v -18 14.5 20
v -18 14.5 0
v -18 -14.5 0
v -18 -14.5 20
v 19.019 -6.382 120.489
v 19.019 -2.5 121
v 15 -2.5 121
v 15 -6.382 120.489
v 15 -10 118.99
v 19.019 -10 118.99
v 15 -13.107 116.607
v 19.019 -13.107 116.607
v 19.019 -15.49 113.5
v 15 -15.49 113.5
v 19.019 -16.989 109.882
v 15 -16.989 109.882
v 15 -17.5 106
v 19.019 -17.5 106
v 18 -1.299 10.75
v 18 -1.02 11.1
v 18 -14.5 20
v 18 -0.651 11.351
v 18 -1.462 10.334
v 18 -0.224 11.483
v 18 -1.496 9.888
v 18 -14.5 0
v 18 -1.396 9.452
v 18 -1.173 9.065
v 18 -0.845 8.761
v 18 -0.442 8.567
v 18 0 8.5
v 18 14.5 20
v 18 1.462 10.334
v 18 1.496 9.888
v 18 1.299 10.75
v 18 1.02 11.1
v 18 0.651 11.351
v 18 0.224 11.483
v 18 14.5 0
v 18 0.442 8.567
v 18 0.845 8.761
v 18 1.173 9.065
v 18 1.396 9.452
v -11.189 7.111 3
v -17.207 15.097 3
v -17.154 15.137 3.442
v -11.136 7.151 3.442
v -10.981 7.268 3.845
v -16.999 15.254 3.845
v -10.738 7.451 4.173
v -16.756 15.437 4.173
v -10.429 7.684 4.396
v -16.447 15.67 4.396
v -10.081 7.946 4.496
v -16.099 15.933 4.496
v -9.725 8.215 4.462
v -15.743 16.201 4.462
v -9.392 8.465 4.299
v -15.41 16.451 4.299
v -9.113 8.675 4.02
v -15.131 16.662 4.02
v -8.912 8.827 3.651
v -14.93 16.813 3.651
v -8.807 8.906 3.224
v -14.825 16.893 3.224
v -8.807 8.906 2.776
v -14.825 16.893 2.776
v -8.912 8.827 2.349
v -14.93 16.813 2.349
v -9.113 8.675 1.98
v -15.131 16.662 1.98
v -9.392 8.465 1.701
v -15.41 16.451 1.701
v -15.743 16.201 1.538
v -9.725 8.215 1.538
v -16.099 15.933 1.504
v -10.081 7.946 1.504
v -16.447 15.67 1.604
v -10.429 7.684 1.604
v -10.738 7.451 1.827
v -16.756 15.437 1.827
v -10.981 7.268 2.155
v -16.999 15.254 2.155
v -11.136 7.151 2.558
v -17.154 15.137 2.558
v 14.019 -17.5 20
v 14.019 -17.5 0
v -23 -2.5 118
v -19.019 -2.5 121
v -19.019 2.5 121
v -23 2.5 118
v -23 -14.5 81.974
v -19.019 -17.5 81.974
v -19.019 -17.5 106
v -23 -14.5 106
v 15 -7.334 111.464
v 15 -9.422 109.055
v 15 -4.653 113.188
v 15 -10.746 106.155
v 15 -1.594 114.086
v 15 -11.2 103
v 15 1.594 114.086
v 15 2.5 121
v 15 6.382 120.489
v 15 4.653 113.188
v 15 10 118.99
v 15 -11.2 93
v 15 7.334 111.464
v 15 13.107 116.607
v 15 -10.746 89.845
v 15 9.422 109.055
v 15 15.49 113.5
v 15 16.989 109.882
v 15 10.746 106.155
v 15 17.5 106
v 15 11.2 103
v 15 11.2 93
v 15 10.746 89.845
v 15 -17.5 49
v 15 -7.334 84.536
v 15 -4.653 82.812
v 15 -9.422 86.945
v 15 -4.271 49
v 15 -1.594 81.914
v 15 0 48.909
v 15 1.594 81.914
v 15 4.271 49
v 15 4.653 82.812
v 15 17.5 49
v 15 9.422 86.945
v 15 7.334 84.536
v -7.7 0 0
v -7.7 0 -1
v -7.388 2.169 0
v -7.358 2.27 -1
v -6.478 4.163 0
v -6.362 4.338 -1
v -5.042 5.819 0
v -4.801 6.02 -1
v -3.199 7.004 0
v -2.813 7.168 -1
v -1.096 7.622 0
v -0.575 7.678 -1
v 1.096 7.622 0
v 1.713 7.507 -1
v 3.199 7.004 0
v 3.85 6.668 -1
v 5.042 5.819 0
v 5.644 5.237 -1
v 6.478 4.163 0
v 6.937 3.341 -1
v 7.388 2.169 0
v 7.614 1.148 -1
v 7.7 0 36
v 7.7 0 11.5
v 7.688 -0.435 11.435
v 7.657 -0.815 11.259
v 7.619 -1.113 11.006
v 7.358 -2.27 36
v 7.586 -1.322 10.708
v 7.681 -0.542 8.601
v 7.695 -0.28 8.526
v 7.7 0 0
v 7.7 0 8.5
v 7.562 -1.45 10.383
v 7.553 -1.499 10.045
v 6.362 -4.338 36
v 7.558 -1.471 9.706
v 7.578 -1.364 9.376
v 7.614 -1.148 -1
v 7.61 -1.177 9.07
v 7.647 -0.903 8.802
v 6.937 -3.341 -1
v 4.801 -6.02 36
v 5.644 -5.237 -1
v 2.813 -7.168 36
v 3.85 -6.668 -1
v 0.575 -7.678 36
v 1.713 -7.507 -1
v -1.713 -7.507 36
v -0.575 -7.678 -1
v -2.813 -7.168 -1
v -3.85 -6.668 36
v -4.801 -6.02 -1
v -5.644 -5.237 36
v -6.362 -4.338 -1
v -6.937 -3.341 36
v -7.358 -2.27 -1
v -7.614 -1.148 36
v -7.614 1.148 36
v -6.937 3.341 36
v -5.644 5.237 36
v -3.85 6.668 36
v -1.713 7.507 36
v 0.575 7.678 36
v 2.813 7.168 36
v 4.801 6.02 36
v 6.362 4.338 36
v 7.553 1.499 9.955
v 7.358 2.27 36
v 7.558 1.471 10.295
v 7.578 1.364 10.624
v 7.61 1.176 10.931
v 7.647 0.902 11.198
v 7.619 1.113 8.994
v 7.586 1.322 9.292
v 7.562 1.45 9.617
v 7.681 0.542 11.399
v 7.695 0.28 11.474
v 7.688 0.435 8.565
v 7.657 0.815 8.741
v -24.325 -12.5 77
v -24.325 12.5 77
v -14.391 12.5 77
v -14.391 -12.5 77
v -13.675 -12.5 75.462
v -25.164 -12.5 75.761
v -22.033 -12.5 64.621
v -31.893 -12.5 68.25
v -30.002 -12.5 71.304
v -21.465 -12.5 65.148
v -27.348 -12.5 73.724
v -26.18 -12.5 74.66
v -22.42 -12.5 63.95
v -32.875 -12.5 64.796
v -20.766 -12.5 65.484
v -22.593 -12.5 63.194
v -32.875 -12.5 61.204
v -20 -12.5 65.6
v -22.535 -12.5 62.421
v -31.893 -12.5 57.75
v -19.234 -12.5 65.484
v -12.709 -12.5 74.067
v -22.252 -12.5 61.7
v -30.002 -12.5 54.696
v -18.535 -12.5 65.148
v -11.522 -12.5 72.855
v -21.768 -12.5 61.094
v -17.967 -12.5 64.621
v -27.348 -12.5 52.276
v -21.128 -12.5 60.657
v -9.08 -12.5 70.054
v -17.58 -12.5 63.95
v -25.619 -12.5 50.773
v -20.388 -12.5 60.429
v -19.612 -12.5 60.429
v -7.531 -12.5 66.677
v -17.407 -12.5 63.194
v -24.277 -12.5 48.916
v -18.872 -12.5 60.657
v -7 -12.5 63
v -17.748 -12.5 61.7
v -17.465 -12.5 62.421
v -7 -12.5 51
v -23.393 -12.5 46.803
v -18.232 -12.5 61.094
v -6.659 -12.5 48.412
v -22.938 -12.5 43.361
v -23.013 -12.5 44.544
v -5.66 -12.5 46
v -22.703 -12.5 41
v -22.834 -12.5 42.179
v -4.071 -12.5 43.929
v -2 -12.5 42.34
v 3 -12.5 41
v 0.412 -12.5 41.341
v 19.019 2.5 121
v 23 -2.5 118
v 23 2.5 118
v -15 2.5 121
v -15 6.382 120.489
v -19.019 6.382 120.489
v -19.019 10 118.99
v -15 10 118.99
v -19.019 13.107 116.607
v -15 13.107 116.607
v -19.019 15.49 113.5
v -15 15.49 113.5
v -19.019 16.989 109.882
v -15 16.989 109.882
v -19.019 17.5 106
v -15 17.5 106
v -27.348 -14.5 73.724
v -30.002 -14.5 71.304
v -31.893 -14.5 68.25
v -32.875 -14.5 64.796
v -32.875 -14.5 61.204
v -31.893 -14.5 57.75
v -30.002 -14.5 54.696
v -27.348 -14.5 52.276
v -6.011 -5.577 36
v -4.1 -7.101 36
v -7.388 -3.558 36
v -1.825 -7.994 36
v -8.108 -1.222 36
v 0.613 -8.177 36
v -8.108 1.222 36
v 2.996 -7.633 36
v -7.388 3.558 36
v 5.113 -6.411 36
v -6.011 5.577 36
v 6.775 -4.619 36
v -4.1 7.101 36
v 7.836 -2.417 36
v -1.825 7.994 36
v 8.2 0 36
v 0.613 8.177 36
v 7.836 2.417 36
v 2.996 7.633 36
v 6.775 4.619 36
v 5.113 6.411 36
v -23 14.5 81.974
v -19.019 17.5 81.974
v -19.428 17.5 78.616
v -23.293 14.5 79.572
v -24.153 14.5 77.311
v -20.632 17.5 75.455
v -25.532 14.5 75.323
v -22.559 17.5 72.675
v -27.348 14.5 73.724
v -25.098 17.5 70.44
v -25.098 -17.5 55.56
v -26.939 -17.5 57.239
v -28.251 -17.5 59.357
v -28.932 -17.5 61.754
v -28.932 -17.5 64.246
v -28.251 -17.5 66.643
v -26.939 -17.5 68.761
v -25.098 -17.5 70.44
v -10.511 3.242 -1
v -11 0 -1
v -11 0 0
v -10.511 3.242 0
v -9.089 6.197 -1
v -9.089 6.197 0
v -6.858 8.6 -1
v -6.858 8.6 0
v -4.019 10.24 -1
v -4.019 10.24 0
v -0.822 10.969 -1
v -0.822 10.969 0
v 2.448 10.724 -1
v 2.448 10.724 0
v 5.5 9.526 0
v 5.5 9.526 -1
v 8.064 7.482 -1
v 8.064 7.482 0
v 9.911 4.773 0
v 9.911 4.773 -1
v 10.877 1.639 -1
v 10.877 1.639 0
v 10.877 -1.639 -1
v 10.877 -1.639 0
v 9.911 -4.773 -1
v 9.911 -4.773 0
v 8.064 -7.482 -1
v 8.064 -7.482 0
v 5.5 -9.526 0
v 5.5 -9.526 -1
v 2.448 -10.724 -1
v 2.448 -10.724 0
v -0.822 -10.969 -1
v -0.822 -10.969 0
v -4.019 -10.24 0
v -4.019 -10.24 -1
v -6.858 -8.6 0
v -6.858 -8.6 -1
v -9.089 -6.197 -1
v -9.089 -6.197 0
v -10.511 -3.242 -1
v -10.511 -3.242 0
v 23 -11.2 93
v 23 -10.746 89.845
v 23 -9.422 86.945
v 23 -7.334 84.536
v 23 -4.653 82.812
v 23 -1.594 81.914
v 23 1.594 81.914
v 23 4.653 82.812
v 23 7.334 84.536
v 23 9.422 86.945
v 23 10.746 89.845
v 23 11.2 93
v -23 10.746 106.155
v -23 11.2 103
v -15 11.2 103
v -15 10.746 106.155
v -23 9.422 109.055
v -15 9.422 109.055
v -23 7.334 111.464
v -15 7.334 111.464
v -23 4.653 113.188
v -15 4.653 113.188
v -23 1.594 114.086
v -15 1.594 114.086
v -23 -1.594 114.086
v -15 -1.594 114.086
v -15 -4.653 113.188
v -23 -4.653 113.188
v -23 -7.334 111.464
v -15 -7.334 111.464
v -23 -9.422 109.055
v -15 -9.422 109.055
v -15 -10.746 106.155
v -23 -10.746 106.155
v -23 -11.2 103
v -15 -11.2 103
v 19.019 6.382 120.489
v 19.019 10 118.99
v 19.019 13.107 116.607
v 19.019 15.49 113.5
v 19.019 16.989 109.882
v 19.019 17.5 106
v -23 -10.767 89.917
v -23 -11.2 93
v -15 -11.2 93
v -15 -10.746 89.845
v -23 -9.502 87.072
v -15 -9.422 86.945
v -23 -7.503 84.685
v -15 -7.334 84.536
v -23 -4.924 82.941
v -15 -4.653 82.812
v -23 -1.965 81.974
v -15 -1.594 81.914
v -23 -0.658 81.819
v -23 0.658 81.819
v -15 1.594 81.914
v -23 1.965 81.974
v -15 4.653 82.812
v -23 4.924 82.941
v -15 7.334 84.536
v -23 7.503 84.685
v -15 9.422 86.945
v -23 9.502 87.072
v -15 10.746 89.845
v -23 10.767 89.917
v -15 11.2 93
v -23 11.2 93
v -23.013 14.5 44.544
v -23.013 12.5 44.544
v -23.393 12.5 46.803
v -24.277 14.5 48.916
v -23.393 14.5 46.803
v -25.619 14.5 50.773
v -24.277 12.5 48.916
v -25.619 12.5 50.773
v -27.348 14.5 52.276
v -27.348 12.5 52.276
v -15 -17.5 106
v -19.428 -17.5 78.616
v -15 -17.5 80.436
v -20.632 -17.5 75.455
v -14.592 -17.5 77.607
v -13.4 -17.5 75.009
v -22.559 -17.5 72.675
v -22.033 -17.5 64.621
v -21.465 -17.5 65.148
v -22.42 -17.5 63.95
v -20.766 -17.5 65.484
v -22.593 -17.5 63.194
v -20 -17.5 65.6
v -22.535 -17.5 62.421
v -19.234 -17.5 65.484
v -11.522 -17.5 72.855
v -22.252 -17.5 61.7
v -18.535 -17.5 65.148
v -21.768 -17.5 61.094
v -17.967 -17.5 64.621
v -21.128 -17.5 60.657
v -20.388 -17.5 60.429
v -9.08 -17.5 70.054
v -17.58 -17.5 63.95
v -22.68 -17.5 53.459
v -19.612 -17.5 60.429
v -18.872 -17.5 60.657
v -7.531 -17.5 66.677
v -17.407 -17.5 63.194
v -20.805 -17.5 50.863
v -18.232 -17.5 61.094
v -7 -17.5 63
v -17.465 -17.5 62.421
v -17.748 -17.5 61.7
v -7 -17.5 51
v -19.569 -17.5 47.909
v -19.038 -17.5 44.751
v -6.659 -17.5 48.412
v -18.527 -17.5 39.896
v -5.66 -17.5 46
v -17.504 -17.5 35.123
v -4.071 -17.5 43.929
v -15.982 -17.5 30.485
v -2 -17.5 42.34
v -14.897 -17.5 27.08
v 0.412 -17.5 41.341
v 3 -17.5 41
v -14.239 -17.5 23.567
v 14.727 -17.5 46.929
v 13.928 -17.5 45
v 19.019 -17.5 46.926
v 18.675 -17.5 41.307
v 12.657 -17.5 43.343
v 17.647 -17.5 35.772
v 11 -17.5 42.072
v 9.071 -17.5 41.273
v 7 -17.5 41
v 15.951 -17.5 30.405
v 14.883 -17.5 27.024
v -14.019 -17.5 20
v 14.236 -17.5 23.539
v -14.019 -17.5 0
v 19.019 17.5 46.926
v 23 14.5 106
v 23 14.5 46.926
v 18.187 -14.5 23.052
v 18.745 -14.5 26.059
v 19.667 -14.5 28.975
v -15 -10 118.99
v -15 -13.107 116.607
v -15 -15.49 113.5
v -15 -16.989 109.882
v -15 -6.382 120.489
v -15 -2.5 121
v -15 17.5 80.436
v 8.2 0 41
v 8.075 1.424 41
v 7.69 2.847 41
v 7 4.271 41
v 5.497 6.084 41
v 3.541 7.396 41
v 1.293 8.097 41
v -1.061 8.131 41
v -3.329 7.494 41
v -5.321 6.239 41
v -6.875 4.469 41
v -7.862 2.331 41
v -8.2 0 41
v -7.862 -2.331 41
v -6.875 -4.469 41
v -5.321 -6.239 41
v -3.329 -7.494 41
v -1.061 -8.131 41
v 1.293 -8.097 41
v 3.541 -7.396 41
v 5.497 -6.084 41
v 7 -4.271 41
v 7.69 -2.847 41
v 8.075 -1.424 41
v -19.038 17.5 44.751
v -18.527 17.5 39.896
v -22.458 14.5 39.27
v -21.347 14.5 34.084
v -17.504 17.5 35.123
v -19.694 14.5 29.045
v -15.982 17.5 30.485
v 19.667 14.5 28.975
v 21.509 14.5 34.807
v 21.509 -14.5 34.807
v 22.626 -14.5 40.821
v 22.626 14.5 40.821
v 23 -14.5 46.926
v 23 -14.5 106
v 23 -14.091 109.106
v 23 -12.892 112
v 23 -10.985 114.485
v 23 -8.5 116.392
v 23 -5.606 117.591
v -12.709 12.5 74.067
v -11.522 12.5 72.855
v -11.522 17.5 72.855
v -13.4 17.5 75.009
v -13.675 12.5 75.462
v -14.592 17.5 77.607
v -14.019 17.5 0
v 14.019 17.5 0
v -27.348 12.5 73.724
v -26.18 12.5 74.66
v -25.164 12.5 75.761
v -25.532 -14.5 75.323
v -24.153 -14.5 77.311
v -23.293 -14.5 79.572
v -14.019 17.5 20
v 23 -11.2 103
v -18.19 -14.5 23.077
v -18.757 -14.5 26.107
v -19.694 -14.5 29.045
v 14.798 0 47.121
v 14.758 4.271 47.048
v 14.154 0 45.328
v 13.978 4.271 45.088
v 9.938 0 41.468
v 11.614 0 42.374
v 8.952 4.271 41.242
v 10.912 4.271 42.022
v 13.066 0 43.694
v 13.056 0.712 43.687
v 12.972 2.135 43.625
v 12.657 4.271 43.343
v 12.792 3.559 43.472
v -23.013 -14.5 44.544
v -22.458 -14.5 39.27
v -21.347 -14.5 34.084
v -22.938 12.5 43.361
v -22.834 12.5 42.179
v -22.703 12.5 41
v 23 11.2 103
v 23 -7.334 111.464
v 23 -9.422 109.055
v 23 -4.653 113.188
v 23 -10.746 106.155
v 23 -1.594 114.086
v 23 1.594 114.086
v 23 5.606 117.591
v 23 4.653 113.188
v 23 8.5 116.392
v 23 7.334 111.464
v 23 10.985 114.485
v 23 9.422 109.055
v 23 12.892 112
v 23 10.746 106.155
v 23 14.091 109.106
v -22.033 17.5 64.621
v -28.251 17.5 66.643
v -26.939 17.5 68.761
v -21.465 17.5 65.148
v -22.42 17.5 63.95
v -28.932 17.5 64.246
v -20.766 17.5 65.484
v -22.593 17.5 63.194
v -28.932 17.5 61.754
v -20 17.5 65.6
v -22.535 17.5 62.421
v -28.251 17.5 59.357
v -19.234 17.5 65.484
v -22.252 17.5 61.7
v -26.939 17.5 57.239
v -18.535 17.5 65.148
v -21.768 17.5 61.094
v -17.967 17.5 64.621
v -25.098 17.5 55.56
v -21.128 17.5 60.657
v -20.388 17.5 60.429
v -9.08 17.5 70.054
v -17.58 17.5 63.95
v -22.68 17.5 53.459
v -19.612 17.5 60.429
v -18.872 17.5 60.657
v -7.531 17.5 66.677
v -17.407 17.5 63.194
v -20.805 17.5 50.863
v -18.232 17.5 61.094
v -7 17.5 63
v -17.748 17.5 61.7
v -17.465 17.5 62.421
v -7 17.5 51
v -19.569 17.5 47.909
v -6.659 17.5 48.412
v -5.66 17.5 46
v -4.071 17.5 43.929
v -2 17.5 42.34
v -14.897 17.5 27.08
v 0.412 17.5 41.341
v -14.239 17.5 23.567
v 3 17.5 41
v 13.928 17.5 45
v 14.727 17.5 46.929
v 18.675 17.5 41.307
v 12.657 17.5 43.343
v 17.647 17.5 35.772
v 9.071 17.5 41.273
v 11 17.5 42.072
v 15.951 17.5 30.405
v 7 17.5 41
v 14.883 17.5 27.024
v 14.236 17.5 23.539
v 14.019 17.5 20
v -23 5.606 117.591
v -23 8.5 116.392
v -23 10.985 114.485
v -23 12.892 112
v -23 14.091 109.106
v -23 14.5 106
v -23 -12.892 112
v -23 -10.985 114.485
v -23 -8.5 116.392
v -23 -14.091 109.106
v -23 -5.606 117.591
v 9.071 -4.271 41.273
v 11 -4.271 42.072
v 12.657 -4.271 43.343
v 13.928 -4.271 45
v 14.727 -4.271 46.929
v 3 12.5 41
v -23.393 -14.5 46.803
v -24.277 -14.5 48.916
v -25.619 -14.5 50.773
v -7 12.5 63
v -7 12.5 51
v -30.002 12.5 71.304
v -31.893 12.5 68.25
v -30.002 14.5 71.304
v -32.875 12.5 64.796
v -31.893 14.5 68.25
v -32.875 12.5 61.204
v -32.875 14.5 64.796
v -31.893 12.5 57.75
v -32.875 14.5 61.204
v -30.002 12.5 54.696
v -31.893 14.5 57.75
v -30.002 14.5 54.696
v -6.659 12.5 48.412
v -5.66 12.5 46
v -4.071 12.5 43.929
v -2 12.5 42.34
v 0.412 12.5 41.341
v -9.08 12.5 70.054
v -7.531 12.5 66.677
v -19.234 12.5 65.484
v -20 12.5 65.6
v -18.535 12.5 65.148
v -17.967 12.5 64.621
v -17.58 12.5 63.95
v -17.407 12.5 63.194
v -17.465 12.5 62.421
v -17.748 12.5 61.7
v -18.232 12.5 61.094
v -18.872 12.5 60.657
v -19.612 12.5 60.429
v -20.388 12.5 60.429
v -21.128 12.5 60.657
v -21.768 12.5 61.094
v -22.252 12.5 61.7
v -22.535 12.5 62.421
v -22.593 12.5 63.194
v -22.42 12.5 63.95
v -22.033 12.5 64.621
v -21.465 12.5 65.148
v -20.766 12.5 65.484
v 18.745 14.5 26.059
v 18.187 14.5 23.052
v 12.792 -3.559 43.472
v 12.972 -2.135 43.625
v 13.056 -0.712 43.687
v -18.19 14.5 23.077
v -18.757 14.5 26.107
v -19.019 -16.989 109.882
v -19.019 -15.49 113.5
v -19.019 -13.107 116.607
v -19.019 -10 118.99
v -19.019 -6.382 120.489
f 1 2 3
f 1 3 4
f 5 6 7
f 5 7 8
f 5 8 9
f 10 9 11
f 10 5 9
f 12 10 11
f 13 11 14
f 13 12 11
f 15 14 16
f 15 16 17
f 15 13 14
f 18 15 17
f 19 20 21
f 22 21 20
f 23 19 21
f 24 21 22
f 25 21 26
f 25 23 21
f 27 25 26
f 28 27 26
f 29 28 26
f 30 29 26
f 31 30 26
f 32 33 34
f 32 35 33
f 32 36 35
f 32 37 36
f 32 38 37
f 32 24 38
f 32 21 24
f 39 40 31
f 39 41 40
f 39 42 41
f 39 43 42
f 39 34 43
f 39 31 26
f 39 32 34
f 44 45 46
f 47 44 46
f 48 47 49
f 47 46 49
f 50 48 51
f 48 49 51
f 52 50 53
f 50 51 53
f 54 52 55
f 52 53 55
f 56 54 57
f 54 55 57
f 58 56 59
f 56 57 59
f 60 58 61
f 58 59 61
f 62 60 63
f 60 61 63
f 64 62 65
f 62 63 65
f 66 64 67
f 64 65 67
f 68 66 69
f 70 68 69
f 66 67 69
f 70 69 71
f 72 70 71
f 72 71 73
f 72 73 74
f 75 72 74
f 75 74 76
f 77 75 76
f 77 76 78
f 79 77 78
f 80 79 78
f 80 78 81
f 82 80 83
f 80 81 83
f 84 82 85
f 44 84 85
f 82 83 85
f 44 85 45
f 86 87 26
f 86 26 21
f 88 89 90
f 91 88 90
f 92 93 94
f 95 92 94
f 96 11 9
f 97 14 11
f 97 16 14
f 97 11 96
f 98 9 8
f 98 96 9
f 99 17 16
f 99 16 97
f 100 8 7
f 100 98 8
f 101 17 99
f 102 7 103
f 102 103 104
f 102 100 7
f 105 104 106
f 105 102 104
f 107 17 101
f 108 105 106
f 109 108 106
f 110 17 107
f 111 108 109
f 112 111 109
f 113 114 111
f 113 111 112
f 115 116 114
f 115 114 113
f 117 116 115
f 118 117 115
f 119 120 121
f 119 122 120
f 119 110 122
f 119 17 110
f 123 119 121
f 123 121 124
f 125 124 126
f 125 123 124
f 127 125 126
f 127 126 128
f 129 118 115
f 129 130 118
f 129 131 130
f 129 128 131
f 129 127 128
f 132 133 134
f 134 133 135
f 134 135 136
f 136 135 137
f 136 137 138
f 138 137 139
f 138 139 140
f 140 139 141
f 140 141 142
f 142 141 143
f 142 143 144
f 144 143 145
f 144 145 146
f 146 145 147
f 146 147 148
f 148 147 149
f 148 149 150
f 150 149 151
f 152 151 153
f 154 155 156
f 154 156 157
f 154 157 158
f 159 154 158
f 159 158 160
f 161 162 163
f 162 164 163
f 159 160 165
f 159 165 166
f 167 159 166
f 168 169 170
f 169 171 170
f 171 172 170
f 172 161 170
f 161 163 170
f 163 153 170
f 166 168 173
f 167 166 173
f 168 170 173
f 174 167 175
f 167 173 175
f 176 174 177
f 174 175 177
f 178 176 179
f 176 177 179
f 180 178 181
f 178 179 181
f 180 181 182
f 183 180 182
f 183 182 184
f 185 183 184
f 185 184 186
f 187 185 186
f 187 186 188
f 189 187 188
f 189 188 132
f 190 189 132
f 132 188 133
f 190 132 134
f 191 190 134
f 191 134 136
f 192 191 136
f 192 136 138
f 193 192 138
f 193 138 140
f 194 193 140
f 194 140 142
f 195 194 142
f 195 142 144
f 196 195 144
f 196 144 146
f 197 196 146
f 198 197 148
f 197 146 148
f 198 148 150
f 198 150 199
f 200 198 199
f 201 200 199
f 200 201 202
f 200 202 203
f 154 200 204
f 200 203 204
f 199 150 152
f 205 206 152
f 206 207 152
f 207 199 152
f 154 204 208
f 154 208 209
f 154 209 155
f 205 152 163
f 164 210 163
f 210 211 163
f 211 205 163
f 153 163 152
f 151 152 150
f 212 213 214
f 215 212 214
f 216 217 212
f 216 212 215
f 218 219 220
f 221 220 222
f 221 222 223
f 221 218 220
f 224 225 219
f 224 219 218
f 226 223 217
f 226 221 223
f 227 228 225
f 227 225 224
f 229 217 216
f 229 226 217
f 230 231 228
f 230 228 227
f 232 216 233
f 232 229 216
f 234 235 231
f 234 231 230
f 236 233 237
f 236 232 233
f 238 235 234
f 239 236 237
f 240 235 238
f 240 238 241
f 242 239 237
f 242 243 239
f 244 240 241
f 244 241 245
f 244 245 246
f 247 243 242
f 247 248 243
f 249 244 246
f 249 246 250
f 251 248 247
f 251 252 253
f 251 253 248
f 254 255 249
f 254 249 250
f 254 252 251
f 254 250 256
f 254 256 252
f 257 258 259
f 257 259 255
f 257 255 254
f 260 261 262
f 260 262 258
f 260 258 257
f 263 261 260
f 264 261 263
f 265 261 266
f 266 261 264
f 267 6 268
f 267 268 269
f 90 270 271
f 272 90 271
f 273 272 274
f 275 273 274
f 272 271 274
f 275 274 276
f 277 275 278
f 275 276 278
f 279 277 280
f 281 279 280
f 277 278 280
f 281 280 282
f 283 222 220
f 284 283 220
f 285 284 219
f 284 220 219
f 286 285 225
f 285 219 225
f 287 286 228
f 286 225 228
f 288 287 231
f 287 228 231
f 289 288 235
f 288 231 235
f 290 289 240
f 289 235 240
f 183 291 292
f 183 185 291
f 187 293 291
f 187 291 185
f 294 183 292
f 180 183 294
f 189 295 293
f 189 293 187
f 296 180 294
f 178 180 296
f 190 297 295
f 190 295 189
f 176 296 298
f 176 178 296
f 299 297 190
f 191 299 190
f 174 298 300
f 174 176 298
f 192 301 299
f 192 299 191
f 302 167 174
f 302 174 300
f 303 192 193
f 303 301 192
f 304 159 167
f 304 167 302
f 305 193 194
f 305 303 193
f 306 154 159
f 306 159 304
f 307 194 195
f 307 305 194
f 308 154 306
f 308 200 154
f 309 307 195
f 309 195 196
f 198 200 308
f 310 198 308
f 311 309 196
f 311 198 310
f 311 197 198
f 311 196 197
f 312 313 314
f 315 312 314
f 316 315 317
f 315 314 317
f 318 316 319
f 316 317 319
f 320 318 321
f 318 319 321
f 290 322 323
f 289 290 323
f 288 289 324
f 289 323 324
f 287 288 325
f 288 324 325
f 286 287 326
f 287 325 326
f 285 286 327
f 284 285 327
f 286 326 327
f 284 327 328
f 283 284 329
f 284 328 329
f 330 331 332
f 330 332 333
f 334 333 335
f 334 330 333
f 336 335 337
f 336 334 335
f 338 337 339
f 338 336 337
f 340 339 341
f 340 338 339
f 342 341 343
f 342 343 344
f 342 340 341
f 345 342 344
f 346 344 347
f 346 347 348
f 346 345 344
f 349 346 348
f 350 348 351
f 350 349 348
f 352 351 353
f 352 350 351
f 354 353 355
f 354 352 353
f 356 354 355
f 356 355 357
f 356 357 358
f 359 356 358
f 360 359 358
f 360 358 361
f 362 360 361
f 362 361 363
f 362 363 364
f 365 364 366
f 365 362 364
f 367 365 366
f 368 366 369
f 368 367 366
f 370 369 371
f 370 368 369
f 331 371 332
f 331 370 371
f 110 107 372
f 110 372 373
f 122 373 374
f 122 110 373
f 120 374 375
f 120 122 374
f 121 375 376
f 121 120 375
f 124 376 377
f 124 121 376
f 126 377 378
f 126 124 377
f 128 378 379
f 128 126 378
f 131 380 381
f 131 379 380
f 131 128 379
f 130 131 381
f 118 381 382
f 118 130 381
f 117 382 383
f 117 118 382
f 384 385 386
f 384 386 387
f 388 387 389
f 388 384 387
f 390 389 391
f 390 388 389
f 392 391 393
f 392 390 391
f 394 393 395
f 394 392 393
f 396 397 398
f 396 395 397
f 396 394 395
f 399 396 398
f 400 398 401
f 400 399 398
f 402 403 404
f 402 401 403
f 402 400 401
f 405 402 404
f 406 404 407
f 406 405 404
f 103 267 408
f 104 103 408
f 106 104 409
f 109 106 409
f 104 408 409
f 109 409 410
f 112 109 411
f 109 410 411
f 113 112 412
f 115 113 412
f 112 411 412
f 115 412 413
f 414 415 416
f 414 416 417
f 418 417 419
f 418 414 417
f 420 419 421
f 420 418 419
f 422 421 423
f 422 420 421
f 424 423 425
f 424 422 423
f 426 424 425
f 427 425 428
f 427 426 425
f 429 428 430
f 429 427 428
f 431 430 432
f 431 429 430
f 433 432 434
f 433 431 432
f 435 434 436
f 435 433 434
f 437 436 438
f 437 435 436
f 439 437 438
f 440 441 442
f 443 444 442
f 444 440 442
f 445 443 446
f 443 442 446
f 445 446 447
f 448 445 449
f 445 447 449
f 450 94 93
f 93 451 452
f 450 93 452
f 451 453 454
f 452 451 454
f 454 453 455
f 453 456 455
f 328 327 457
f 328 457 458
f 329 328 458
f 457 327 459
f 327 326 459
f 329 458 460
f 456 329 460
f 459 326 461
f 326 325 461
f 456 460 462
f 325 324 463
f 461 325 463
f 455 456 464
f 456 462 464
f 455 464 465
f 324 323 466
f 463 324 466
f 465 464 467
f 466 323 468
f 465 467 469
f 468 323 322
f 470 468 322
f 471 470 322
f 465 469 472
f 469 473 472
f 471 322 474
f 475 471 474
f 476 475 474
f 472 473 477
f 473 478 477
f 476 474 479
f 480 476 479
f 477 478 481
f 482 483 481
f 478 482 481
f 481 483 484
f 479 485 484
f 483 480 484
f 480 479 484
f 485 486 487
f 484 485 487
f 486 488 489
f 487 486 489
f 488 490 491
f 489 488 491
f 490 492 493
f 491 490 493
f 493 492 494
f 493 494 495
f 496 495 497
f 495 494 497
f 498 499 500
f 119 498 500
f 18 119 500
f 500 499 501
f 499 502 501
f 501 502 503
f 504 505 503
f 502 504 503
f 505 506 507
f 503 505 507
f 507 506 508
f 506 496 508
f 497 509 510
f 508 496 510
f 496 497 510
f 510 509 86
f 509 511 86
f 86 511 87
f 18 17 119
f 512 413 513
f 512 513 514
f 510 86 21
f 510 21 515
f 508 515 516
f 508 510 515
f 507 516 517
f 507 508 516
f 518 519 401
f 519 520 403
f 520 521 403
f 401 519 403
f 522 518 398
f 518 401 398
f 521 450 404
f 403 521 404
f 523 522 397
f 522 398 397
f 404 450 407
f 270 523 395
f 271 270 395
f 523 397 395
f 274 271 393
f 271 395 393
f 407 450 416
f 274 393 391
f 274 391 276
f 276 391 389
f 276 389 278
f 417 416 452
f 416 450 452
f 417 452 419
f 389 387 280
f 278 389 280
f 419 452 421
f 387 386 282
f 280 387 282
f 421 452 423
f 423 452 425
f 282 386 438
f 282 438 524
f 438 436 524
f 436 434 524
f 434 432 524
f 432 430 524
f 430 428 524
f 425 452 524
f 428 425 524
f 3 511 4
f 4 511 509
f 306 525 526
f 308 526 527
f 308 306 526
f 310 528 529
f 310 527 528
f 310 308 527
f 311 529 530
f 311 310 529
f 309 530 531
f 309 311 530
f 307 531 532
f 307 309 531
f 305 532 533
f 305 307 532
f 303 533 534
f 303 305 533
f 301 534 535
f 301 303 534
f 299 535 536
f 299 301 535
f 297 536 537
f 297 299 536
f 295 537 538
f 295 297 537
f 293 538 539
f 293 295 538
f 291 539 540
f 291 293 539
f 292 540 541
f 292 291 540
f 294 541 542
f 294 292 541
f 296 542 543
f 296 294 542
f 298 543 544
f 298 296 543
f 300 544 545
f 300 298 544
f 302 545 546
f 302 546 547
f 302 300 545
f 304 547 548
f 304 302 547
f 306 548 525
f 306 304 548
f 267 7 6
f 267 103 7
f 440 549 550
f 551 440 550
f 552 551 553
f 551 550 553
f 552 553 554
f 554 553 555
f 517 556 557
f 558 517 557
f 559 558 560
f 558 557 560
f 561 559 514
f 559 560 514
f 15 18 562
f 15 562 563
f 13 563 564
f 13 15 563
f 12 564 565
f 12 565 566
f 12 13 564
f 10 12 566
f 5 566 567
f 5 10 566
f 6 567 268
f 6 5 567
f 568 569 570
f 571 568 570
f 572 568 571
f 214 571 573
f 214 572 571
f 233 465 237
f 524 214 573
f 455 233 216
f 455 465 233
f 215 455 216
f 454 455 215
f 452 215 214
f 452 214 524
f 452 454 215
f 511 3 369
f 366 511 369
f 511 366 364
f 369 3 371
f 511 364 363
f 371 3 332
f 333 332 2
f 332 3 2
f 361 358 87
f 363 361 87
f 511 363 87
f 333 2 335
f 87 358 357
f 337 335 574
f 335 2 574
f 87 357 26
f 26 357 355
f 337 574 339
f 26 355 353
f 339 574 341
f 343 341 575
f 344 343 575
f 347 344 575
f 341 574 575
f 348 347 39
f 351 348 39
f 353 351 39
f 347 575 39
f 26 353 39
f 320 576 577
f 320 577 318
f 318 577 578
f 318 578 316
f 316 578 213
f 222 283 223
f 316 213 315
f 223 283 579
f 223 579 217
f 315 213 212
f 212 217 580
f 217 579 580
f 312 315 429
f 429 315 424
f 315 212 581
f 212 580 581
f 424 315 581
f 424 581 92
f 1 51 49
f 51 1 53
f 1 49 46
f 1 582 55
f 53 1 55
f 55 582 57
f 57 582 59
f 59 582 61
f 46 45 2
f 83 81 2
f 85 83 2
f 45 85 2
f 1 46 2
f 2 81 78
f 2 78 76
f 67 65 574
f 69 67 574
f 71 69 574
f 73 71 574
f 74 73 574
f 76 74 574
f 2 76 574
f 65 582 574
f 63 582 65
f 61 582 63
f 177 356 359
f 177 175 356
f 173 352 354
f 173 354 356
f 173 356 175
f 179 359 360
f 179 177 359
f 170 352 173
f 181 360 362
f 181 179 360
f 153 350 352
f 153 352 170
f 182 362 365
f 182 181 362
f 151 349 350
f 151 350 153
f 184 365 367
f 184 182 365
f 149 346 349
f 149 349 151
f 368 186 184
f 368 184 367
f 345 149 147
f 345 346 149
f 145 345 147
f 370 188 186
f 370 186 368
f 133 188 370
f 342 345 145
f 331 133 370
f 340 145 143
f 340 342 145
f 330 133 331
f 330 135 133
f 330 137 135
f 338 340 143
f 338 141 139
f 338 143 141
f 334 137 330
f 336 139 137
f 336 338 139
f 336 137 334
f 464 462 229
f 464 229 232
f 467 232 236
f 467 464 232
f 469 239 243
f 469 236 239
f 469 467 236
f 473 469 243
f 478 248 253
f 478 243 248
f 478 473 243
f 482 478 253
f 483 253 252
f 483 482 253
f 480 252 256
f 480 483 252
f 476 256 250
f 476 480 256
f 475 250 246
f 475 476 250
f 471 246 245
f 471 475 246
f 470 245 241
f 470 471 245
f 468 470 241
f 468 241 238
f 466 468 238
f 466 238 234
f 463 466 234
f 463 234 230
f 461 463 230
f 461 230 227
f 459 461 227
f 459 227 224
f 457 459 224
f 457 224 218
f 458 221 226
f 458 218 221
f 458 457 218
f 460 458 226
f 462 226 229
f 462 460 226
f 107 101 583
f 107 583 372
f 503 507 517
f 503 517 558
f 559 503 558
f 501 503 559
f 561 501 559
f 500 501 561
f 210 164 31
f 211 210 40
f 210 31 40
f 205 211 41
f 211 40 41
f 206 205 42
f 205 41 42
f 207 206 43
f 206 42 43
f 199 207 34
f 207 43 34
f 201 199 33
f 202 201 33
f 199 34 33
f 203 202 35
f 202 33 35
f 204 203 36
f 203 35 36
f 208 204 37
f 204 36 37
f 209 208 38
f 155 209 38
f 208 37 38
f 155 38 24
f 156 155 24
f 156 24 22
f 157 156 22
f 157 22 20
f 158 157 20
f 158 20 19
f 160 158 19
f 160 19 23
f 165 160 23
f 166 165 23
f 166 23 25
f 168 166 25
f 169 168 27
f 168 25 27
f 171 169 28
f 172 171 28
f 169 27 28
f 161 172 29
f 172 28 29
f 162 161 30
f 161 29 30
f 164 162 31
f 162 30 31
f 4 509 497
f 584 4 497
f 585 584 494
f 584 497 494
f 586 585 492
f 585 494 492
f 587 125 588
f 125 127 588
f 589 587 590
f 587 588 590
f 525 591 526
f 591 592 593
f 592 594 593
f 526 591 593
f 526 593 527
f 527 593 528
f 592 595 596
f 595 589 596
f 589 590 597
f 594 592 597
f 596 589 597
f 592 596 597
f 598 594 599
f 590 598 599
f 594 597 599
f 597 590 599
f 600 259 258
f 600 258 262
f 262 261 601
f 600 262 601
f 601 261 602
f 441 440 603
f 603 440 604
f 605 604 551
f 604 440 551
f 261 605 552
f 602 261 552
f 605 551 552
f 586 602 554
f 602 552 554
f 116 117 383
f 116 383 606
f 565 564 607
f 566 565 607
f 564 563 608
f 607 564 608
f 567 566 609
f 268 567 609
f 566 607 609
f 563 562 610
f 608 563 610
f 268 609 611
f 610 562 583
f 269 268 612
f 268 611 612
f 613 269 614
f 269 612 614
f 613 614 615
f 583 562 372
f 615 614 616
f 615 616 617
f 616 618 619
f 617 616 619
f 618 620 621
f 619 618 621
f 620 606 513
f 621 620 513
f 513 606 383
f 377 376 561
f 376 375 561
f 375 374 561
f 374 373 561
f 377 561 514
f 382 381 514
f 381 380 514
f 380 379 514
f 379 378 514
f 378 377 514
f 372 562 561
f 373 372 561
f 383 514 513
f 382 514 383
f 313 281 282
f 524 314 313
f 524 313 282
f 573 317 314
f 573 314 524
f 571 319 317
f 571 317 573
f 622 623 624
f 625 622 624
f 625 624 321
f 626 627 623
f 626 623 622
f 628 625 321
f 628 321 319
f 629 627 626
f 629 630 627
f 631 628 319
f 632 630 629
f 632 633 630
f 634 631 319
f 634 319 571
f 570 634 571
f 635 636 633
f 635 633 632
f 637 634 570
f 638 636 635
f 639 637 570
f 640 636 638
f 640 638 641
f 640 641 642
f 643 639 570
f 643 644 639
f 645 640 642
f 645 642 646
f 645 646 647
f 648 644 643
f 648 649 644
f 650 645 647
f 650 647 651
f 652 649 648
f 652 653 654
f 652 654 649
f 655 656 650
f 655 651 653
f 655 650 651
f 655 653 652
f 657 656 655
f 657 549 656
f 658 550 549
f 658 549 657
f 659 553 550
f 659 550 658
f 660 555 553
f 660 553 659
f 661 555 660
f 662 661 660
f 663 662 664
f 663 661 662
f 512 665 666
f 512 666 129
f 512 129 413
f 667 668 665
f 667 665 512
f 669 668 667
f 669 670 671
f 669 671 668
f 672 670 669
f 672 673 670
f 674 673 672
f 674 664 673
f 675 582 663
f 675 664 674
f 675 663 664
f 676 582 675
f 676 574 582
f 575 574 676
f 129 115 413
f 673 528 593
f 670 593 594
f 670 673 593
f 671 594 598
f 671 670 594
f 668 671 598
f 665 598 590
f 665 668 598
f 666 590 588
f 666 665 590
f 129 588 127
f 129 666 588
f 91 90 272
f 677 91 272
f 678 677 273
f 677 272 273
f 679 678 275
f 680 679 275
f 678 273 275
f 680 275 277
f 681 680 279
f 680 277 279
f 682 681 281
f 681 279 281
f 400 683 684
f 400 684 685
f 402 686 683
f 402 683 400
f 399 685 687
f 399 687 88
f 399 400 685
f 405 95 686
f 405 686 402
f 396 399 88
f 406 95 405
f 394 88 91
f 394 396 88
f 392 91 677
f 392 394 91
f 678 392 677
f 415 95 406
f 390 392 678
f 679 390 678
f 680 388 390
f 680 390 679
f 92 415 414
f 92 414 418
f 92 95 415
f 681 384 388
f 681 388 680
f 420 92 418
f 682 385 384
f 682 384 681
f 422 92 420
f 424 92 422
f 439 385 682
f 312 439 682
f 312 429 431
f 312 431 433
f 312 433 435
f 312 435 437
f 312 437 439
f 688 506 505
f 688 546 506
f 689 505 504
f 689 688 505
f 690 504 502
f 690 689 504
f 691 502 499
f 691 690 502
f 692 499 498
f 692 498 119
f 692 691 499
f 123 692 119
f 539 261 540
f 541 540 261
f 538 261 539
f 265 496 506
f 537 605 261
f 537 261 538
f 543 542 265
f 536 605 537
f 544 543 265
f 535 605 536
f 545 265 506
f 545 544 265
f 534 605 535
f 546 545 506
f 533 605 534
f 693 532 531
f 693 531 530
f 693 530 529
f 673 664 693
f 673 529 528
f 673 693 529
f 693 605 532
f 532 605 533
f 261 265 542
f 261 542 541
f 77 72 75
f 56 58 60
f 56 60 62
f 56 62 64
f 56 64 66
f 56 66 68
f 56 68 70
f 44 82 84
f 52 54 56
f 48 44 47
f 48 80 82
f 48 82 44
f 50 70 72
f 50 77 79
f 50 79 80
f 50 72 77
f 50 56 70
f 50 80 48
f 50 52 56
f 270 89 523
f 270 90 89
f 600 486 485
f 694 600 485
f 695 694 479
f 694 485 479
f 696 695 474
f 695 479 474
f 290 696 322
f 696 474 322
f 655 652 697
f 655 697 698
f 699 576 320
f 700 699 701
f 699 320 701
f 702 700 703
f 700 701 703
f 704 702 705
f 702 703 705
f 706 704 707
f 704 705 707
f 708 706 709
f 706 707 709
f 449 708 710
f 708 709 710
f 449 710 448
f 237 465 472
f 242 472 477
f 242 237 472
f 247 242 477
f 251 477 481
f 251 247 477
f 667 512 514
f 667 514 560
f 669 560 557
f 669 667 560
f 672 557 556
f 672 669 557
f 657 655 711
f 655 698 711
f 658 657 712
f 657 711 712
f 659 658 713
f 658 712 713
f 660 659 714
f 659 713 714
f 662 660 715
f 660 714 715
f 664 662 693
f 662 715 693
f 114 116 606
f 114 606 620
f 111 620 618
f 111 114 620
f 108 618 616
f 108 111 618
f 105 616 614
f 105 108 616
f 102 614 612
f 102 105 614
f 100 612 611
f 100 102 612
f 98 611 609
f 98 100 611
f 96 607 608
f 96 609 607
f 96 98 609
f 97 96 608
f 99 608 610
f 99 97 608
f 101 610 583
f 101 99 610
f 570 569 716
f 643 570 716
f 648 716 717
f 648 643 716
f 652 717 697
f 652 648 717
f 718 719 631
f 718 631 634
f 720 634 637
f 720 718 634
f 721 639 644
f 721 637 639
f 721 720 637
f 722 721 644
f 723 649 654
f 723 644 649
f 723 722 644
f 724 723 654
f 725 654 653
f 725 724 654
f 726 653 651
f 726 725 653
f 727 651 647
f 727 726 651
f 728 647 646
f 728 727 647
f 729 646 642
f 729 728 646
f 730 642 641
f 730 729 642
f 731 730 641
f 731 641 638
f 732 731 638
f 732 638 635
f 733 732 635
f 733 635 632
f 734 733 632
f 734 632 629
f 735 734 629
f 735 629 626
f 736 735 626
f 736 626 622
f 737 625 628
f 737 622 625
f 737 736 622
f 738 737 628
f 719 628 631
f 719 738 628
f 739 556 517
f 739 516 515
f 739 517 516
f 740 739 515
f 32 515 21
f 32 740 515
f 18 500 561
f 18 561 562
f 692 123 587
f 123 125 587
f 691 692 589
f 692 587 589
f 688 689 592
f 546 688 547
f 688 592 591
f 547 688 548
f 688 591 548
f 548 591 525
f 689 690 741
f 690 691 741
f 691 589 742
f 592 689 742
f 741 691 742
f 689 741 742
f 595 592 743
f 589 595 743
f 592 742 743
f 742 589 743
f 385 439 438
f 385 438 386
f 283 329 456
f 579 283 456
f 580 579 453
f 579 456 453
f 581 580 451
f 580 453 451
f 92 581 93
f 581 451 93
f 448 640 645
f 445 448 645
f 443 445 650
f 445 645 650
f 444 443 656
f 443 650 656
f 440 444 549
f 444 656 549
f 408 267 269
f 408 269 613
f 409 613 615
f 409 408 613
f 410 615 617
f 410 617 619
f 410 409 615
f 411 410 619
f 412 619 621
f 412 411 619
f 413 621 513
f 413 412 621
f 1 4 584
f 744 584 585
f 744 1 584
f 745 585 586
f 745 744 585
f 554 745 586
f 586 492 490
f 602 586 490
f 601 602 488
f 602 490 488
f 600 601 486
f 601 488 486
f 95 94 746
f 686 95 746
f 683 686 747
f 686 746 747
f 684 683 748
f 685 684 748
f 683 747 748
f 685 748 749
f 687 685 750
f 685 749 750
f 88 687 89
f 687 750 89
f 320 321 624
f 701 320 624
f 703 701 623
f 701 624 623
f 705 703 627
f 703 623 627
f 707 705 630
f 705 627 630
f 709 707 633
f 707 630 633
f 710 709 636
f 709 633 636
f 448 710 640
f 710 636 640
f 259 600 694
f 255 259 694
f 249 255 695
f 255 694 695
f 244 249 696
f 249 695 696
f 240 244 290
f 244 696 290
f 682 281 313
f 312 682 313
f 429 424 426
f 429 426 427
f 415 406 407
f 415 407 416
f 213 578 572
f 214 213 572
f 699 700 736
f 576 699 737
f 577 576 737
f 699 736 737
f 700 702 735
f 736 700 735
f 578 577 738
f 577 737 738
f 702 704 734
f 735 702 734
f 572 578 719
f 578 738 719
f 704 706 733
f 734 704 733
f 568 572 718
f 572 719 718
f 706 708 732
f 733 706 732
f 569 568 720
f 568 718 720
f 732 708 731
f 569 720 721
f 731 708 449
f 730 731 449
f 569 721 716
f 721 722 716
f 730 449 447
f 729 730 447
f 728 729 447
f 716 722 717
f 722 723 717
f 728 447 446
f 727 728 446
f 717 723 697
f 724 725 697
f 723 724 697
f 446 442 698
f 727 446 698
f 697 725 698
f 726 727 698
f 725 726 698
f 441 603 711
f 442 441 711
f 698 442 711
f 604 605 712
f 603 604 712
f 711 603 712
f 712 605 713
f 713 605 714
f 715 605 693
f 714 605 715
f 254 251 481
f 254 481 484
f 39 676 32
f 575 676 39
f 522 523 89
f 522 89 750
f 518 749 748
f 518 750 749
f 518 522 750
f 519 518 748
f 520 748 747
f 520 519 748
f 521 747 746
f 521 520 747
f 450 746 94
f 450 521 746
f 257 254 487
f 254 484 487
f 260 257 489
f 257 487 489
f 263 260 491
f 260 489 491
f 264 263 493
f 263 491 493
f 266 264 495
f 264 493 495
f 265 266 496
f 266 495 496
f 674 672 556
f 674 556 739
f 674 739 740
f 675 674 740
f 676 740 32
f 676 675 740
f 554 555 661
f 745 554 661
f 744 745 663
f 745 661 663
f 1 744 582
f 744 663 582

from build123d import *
from OCP.BRepFilletAPI import BRepFilletAPI_MakeChamfer
from build123d.topology import SkipClean

# Parameters (mm, degrees)
SKETCH1_W               = 46
SKETCH1_H               = 35
SKETCH1_R               = 7.7
BOSS_EXTRUDE1_DEPTH     = 36
BOSS_EXTRUDE2_START     = 1
SKETCH2_R               = 11
SKETCH2_R_2             = 7.7
BOSS_EXTRUDE2_DEPTH     = 1
SKETCH5_W               = 8
SKETCH5_H               = 35
BOSS_EXTRUDE4_DEPTH     = 85
SKETCH3_W               = 38
SKETCH3_H               = 35
SKETCH3_R               = 8.2
BOSS_EXTRUDE3_DEPTH     = 5
CUT_EXTRUDE1_DEPTH      = 125.403577119
CUT_EXTRUDE1_DEPTH_BACK = 125.403577119
SKETCH4_R               = 2.6
BOSS_EXTRUDE6_REACH     = 130.043
SKETCH9_W               = 8
SKETCH9_H               = 35
BOSS_EXTRUDE5_DEPTH     = 80
FILLET1_R               = 15
FILLET9_R               = 10
FILLET11_R              = 8
CUT_EXTRUDE2_DEPTH      = 35
FILLET12_R              = 50
SKETCH6_W               = 26
SKETCH6_H               = 36
CUT_EXTRUDE3_DEPTH      = 12.5
FILLET13_R              = 10
CUT_EXTRUDE4_REACH      = 132.626
CHAMFER1_SIZE           = 3
CHAMFER1_SIZE2          = 3.981134465
CUT_EXTRUDE5_REACH      = 134.47
CUT_EXTRUDE5_END_RADIUS = 7.7
SKETCH23_R              = 1.5
SKETCH25_R              = 1.5
CUT_EXTRUDE6_DEPTH      = 10


with BuildPart() as part:
    # Sketch1 → Boss-Extrude1 (new body)
    with BuildSketch(Plane.XY):
        Rectangle(SKETCH1_W, SKETCH1_H)
        Circle(SKETCH1_R, mode=Mode.SUBTRACT)
    extrude(amount=BOSS_EXTRUDE1_DEPTH)

    # Sketch2 → Boss-Extrude2 (add)
    with SkipClean():  # the faces are left unmerged after this step: merging them gives an invalid solid
        with BuildSketch(Plane(origin=(0, 0, 0), x_dir=(-1, 0, 0), z_dir=(0, 0, -1)).offset(BOSS_EXTRUDE2_START)):
            Circle(SKETCH2_R)
            Circle(SKETCH2_R_2, mode=Mode.SUBTRACT)
        extrude(amount=-BOSS_EXTRUDE2_DEPTH)

    # Sketch5 → Boss-Extrude4 (add)
    with SkipClean():  # the faces are left unmerged after this step: merging them gives an invalid solid
        with BuildSketch(Plane.XY.offset(36)):
            with Locations((-19, 0)):
                Rectangle(SKETCH5_W, SKETCH5_H)
        extrude(amount=BOSS_EXTRUDE4_DEPTH)

    # Sketch3 → Boss-Extrude3 (add)
    with BuildSketch(Plane.XY.offset(36)):
        with Locations((4, 0)):
            Rectangle(SKETCH3_W, SKETCH3_H)
        Circle(SKETCH3_R, mode=Mode.SUBTRACT)
    extrude(amount=BOSS_EXTRUDE3_DEPTH)

    # Sketch4 → Cut-Extrude1 (cut, two sides: drawn at the far end of the back side and taken through both)
    with BuildSketch(Plane(origin=(0, 0, 0), x_dir=(1, 0, 0), z_dir=(0, 1, 0)).offset(-CUT_EXTRUDE1_DEPTH_BACK)):
        with Locations(Location((-20, -63, 0), (0, 0, 270))):
            Circle(SKETCH4_R)
    extrude(amount=CUT_EXTRUDE1_DEPTH + CUT_EXTRUDE1_DEPTH_BACK, mode=Mode.SUBTRACT)

    # Boss-Extrude6: up to this face of the body (flat: up to its plane)
    boss_extrude6_end = Plane(part.part.faces().sort_by_distance((-4.685176782, -17.5, 35.598204078))[0])
    # Sketch10 → Boss-Extrude6 (add, up to the picked face)
    with BuildSketch(Plane(origin=(0, 17.5, 0), x_dir=(1, 0, 0), z_dir=(0, 1, 0)), mode=Mode.PRIVATE) as boss_extrude6_sk1:
        with BuildLine():
            Line((-23, -50.350889359), (-23, -75.649110641))
            ThreePointArc((-23, -75.649110641), (-33, -63), (-23, -50.350889359))
        make_face()
    boss_extrude6_tool1 = split(extrude(boss_extrude6_sk1.sketch, amount=-BOSS_EXTRUDE6_REACH, mode=Mode.PRIVATE), bisect_by=boss_extrude6_end, keep=Keep.BOTH, mode=Mode.PRIVATE)
    # Sketch10 → Boss-Extrude6 (add, up to the picked face)
    with BuildSketch(Plane(origin=(0, 17.5, 0), x_dir=(1, 0, 0), z_dir=(0, 1, 0)), mode=Mode.PRIVATE) as boss_extrude6_sk2:
        with BuildLine():
            Line((-15, -41), (-15, -75))
            ThreePointArc((-15, -75), (-9.183346174, -70.211102551), (-7, -63))
            Line((-7, -63), (-7, -41))
            Line((-7, -41), (-15, -41))
        make_face()
    boss_extrude6_tool2 = split(extrude(boss_extrude6_sk2.sketch, amount=-BOSS_EXTRUDE6_REACH, mode=Mode.PRIVATE), bisect_by=boss_extrude6_end, keep=Keep.BOTH, mode=Mode.PRIVATE)
    add(boss_extrude6_tool1.solids().sort_by(Axis((-27.170601, 17.5, 63), (0, -1, 0)))[0])
    add(boss_extrude6_tool2.solids().sort_by(Axis((-11.197055, 17.5, 56.457565), (0, -1, 0)))[0])

    # Sketch9 → Boss-Extrude5 (add)
    with BuildSketch(Plane.XY.offset(41)):
        with Locations((19, 0)):
            Rectangle(SKETCH9_W, SKETCH9_H)
    extrude(amount=BOSS_EXTRUDE5_DEPTH)

    # Fillet1
    fillet1_edges = [part.edges().sort_by_distance(p)[0] for p in [
        (-19, -17.5, 121),
        (-19, 17.5, 121),
        (19, 17.5, 121),
        (19, -17.5, 121),
    ]]
    fillet(fillet1_edges, radius=FILLET1_R)

    # Fillet9
    fillet9_edges = [part.edges().sort_by_distance(p)[0] for p in [
        (-23, 0, 75.649110641),
        (-23, 0, 50.350889359),
        (-15, 0, 75),
    ]]
    fillet(fillet9_edges, radius=FILLET9_R)

    # Fillet11
    fillet11_edges = [part.edges().sort_by_distance(p)[0] for p in [
        (15, 0, 41),
    ]]
    fillet(fillet11_edges, radius=FILLET11_R)

    # Sketch20 → Cut-Extrude2 (cut)
    with BuildSketch(Plane(origin=(0, 17.5, 0), x_dir=(1, 0, 0), z_dir=(0, 1, 0))):
        with BuildLine():
            Line((-18, 0), (-18, -20))
            ThreePointArc((-18, -20), (-19.282917549, -27.90569415), (-23, -35))
            Line((-23, -35), (-23, 0))
            Line((-23, 0), (-18, 0))
        make_face()
        with BuildLine():
            Line((18, -20), (18, 0))
            Line((18, 0), (23, 0))
            Line((23, 0), (23, -35))
            ThreePointArc((23, -35), (19.282917549, -27.90569415), (18, -20))
        make_face()
    extrude(amount=-CUT_EXTRUDE2_DEPTH, mode=Mode.SUBTRACT)

    # Fillet12
    # the kernel refuses this fillet: 50 mm, written as the material it takes off along each edge
    with BuildSketch(Plane(origin=(23, 47.314560089, 35), x_dir=(0, 0, 1), z_dir=(0, -1, 0))) as fillet12_piece_1:
        with BuildLine():
            CenterArc((11.925824036, 50), FILLET12_R, 248.960530219, 21.039469781)
            ThreePointArc((-6.024725321, 3.333333333), (-2.897057104, 1.87507196), (0, 0))
            Line((0, 0), (11.925824036, 0))
        make_face()
    extrude(amount=94.629120178, mode=Mode.SUBTRACT)
    with BuildSketch(Plane(origin=(-23, 41.360846345, 35), x_dir=(0.4854209335921463, 0, -0.8742805712301568), z_dir=(0, -1, 0))) as fillet12_piece_2:
        with BuildLine():
            CenterArc((13.623159586, 49.533850857), FILLET12_R, 243.929167388, 18.240989477)
            Line((-8.350938249, 4.621279963), (-10.548348032, 0.130022873))
            ThreePointArc((-10.548348032, 0.130022873), (-10.318653148, 0.01016864), (-2.427104668, -4.371402856))
            Line((-2.427104668, -4.371402856), (0.681157979, -4.953385086))
            ThreePointArc((0.681157979, -4.953385086), (3.405789897, -4.766925428), (6.130421814, -4.953385086))
            Line((6.130421814, -4.953385086), (6.811579793, 0))
        make_face()
    extrude(amount=82.721692689, mode=Mode.SUBTRACT)

    # Sketch6 → Cut-Extrude3 (cut, symmetric)
    with BuildSketch(Plane(origin=(0, 0, 0), x_dir=(1, 0, 0), z_dir=(0, 1, 0))):
        with Locations((-20, -59)):
            Rectangle(SKETCH6_W, SKETCH6_H)
    extrude(amount=CUT_EXTRUDE3_DEPTH, both=True, mode=Mode.SUBTRACT)

    # Fillet13
    fillet13_edges = [part.edges().sort_by_distance(p)[0] for p in [
        (-7, 15, 41),
        (-7, -15, 41),
    ]]
    fillet(fillet13_edges, radius=FILLET13_R)

    # Cut-Extrude4: up to this face of the body (flat: up to its plane)
    cut_extrude4_end = Plane(part.part.faces().sort_by_distance((23, 0, 82.65958398))[0])
    # Sketch22 → Cut-Extrude4 (cut, up to the picked face)
    with BuildSketch(Plane.ZY.offset(23), mode=Mode.PRIVATE) as cut_extrude4_sk1:
        with BuildLine():
            Line((93, 11.2), (103, 11.2))
            ThreePointArc((103, 11.2), (114.2, 0), (103, -11.2))
            Line((103, -11.2), (93, -11.2))
            ThreePointArc((93, -11.2), (81.8, 0), (93, 11.2))
        make_face()
    cut_extrude4_tool1 = split(extrude(cut_extrude4_sk1.sketch, amount=-CUT_EXTRUDE4_REACH, mode=Mode.PRIVATE), bisect_by=cut_extrude4_end, keep=Keep.BOTH, mode=Mode.PRIVATE)
    add(cut_extrude4_tool1.solids().sort_by(Axis((-23, 0, 98), (1, 0, 0)))[0], mode=Mode.SUBTRACT)

    # Chamfer1: one chamfer whose edges measure the first distance from different faces: ONE call of the kernel's chamfer builder (chamfer() names one face for all edges)
    chamfer1_edges_1 = [part.edges().sort_by_distance(p)[0] for p in [
        (-23, 17.5, 93.986832981),
        (-23, 0, 121),
        (-23, 13.106601718, 116.606601718),
        (-23, -13.106601718, 116.606601718),
        (-23, -17.5, 93.986832981),
    ]]
    chamfer1_side_1 = [part.faces().sort_by_distance(p)[0] for p in [
        (-23, -16.975781081, 93.986832981),
    ]]
    chamfer1_edges_2 = [part.edges().sort_by_distance(p)[0] for p in [
        (-33, -17.5, 63),
    ]]
    chamfer1_side_2 = [part.faces().sort_by_distance(p)[0] for p in [
        (-33, -15, 63),
    ]]
    chamfer1_edges_3 = [part.edges().sort_by_distance(p)[0] for p in [
        (-33, 17.5, 63),
    ]]
    chamfer1_side_3 = [part.faces().sort_by_distance(p)[0] for p in [
        (-33, 15, 63),
    ]]
    chamfer1_edges_4 = [part.edges().sort_by_distance(p)[0] for p in [
        (-24.277251002, -17.5, 48.916492514),
    ]]
    chamfer1_side_4 = [part.faces().sort_by_distance(p)[0] for p in [
        (-24.277251002, -15, 48.916492514),
    ]]
    chamfer1_edges_5 = [part.edges().sort_by_distance(p)[0] for p in [
        (-24.153482631, 17.5, 77.31114192),
        (-24.153482631, -17.5, 77.31114192),
    ]]
    chamfer1_side_5 = [part.faces().sort_by_distance(p)[0] for p in [
        (-24.153482631, 0, 77.31114192),
    ]]
    chamfer1_edges_6 = [part.edges().sort_by_distance(p)[0] for p in [
        (-18, 17.5, 10),
        (-18, -17.5, 10),
    ]]
    chamfer1_side_6 = [part.faces().sort_by_distance(p)[0] for p in [
        (-18, 0, 10),
    ]]
    chamfer1_edges_7 = [part.edges().sort_by_distance(p)[0] for p in [
        (-18.427026171, -17.5, 24.600973508),
        (-18.427026171, 17.5, 24.600973508),
    ]]
    chamfer1_side_7 = [part.faces().sort_by_distance(p)[0] for p in [
        (-18.427026171, 0, 24.600973508),
    ]]
    chamfer1_edges_8 = [part.edges().sort_by_distance(p)[0] for p in [
        (18.420197994, 17.5, 24.564354646),
        (18.420197994, -17.5, 24.564354646),
    ]]
    chamfer1_side_8 = [part.faces().sort_by_distance(p)[0] for p in [
        (18.420197994, 0, 24.564354646),
    ]]
    chamfer1_edges_9 = [part.edges().sort_by_distance(p)[0] for p in [
        (18, 17.5, 10),
        (18, -17.5, 10),
    ]]
    chamfer1_side_9 = [part.faces().sort_by_distance(p)[0] for p in [
        (18, 0, 10),
    ]]
    chamfer1_edges_10 = [part.edges().sort_by_distance(p)[0] for p in [
        (-24.277251002, 17.5, 48.916492514),
    ]]
    chamfer1_side_10 = [part.faces().sort_by_distance(p)[0] for p in [
        (-24.277251002, 15, 48.916492514),
    ]]
    chamfer1_edges_11 = [part.edges().sort_by_distance(p)[0] for p in [
        (-21.971591885, 17.5, 36.66215096),
        (-21.971591885, -17.5, 36.66215096),
    ]]
    chamfer1_side_11 = [part.faces().sort_by_distance(p)[0] for p in [
        (-21.971591885, 0, 36.66215096),
    ]]
    chamfer1_edges_12 = [part.edges().sort_by_distance(p)[0] for p in [
        (22.159604013, 17.5, 37.797114744),
        (22.159604013, -17.5, 37.797114744),
    ]]
    chamfer1_side_12 = [part.faces().sort_by_distance(p)[0] for p in [
        (22.159604013, 0, 37.797114744),
    ]]
    chamfer1_edges_13 = [part.edges().sort_by_distance(p)[0] for p in [
        (23, 0, 121),
        (23, 17.5, 76.462912018),
        (23, -17.5, 76.462912018),
        (23, 13.106601718, 116.606601718),
        (23, -13.106601718, 116.606601718),
    ]]
    chamfer1_side_13 = [part.faces().sort_by_distance(p)[0] for p in [
        (23, 0, 77.610644397),
    ]]
    chamfer1 = BRepFilletAPI_MakeChamfer(part.part.solid().wrapped)
    for e in chamfer1_edges_1:
        chamfer1.Add(CHAMFER1_SIZE, CHAMFER1_SIZE2, e.wrapped, chamfer1_side_1[0].wrapped)  # the first distance lies on this face
    for e in chamfer1_edges_2:
        chamfer1.Add(CHAMFER1_SIZE, CHAMFER1_SIZE2, e.wrapped, chamfer1_side_2[0].wrapped)  # the first distance lies on this face
    for e in chamfer1_edges_3:
        chamfer1.Add(CHAMFER1_SIZE, CHAMFER1_SIZE2, e.wrapped, chamfer1_side_3[0].wrapped)  # the first distance lies on this face
    for e in chamfer1_edges_4:
        chamfer1.Add(CHAMFER1_SIZE, CHAMFER1_SIZE2, e.wrapped, chamfer1_side_4[0].wrapped)  # the first distance lies on this face
    for e in chamfer1_edges_5:
        chamfer1.Add(CHAMFER1_SIZE, CHAMFER1_SIZE2, e.wrapped, chamfer1_side_5[0].wrapped)  # the first distance lies on this face
    for e in chamfer1_edges_6:
        chamfer1.Add(CHAMFER1_SIZE, CHAMFER1_SIZE2, e.wrapped, chamfer1_side_6[0].wrapped)  # the first distance lies on this face
    for e in chamfer1_edges_7:
        chamfer1.Add(CHAMFER1_SIZE, CHAMFER1_SIZE2, e.wrapped, chamfer1_side_7[0].wrapped)  # the first distance lies on this face
    for e in chamfer1_edges_8:
        chamfer1.Add(CHAMFER1_SIZE, CHAMFER1_SIZE2, e.wrapped, chamfer1_side_8[0].wrapped)  # the first distance lies on this face
    for e in chamfer1_edges_9:
        chamfer1.Add(CHAMFER1_SIZE, CHAMFER1_SIZE2, e.wrapped, chamfer1_side_9[0].wrapped)  # the first distance lies on this face
    for e in chamfer1_edges_10:
        chamfer1.Add(CHAMFER1_SIZE, CHAMFER1_SIZE2, e.wrapped, chamfer1_side_10[0].wrapped)  # the first distance lies on this face
    for e in chamfer1_edges_11:
        chamfer1.Add(CHAMFER1_SIZE, CHAMFER1_SIZE2, e.wrapped, chamfer1_side_11[0].wrapped)  # the first distance lies on this face
    for e in chamfer1_edges_12:
        chamfer1.Add(CHAMFER1_SIZE, CHAMFER1_SIZE2, e.wrapped, chamfer1_side_12[0].wrapped)  # the first distance lies on this face
    for e in chamfer1_edges_13:
        chamfer1.Add(CHAMFER1_SIZE, CHAMFER1_SIZE2, e.wrapped, chamfer1_side_13[0].wrapped)  # the first distance lies on this face
    add(Compound.cast(chamfer1.Shape()), mode=Mode.REPLACE)

    # Cut-Extrude5: up to this cylinder (the profile starts outside it)
    cut_extrude5_end = Plane(origin=(0, 0, 10), z_dir=(0, 0, -1)) * Cylinder(CUT_EXTRUDE5_END_RADIUS, 285.34, mode=Mode.PRIVATE)
    # Sketch23 → Cut-Extrude5 (cut, up to the surface)
    with BuildSketch(Plane(origin=(18, 0, 0), x_dir=(0, 0, -1), z_dir=(1, 0, 0)), mode=Mode.PRIVATE) as cut_extrude5_sk1:
        with Locations((-10, 0)):
            Circle(SKETCH23_R)
    cut_extrude5_tool1 = extrude(cut_extrude5_sk1.sketch, amount=-CUT_EXTRUDE5_REACH, mode=Mode.PRIVATE) - cut_extrude5_end
    add(cut_extrude5_tool1.solids().sort_by_distance((18, 0, 10))[0], mode=Mode.SUBTRACT)

    # Sketch25 → Cut-Extrude6 (cut)
    with BuildSketch(Plane(origin=(-13.488411093, 17.899726093, 0), x_dir=(0.7986355100472918, 0.6018150231520498, 0), z_dir=(-0.6018150231520497, 0.7986355100472917, 0))):
        with Locations(Location((-3.156661133, -3, 0), (0, 0, 180))):
            Circle(SKETCH25_R)
    extrude(amount=-CUT_EXTRUDE6_DEPTH, mode=Mode.SUBTRACT)


solid = part.part
